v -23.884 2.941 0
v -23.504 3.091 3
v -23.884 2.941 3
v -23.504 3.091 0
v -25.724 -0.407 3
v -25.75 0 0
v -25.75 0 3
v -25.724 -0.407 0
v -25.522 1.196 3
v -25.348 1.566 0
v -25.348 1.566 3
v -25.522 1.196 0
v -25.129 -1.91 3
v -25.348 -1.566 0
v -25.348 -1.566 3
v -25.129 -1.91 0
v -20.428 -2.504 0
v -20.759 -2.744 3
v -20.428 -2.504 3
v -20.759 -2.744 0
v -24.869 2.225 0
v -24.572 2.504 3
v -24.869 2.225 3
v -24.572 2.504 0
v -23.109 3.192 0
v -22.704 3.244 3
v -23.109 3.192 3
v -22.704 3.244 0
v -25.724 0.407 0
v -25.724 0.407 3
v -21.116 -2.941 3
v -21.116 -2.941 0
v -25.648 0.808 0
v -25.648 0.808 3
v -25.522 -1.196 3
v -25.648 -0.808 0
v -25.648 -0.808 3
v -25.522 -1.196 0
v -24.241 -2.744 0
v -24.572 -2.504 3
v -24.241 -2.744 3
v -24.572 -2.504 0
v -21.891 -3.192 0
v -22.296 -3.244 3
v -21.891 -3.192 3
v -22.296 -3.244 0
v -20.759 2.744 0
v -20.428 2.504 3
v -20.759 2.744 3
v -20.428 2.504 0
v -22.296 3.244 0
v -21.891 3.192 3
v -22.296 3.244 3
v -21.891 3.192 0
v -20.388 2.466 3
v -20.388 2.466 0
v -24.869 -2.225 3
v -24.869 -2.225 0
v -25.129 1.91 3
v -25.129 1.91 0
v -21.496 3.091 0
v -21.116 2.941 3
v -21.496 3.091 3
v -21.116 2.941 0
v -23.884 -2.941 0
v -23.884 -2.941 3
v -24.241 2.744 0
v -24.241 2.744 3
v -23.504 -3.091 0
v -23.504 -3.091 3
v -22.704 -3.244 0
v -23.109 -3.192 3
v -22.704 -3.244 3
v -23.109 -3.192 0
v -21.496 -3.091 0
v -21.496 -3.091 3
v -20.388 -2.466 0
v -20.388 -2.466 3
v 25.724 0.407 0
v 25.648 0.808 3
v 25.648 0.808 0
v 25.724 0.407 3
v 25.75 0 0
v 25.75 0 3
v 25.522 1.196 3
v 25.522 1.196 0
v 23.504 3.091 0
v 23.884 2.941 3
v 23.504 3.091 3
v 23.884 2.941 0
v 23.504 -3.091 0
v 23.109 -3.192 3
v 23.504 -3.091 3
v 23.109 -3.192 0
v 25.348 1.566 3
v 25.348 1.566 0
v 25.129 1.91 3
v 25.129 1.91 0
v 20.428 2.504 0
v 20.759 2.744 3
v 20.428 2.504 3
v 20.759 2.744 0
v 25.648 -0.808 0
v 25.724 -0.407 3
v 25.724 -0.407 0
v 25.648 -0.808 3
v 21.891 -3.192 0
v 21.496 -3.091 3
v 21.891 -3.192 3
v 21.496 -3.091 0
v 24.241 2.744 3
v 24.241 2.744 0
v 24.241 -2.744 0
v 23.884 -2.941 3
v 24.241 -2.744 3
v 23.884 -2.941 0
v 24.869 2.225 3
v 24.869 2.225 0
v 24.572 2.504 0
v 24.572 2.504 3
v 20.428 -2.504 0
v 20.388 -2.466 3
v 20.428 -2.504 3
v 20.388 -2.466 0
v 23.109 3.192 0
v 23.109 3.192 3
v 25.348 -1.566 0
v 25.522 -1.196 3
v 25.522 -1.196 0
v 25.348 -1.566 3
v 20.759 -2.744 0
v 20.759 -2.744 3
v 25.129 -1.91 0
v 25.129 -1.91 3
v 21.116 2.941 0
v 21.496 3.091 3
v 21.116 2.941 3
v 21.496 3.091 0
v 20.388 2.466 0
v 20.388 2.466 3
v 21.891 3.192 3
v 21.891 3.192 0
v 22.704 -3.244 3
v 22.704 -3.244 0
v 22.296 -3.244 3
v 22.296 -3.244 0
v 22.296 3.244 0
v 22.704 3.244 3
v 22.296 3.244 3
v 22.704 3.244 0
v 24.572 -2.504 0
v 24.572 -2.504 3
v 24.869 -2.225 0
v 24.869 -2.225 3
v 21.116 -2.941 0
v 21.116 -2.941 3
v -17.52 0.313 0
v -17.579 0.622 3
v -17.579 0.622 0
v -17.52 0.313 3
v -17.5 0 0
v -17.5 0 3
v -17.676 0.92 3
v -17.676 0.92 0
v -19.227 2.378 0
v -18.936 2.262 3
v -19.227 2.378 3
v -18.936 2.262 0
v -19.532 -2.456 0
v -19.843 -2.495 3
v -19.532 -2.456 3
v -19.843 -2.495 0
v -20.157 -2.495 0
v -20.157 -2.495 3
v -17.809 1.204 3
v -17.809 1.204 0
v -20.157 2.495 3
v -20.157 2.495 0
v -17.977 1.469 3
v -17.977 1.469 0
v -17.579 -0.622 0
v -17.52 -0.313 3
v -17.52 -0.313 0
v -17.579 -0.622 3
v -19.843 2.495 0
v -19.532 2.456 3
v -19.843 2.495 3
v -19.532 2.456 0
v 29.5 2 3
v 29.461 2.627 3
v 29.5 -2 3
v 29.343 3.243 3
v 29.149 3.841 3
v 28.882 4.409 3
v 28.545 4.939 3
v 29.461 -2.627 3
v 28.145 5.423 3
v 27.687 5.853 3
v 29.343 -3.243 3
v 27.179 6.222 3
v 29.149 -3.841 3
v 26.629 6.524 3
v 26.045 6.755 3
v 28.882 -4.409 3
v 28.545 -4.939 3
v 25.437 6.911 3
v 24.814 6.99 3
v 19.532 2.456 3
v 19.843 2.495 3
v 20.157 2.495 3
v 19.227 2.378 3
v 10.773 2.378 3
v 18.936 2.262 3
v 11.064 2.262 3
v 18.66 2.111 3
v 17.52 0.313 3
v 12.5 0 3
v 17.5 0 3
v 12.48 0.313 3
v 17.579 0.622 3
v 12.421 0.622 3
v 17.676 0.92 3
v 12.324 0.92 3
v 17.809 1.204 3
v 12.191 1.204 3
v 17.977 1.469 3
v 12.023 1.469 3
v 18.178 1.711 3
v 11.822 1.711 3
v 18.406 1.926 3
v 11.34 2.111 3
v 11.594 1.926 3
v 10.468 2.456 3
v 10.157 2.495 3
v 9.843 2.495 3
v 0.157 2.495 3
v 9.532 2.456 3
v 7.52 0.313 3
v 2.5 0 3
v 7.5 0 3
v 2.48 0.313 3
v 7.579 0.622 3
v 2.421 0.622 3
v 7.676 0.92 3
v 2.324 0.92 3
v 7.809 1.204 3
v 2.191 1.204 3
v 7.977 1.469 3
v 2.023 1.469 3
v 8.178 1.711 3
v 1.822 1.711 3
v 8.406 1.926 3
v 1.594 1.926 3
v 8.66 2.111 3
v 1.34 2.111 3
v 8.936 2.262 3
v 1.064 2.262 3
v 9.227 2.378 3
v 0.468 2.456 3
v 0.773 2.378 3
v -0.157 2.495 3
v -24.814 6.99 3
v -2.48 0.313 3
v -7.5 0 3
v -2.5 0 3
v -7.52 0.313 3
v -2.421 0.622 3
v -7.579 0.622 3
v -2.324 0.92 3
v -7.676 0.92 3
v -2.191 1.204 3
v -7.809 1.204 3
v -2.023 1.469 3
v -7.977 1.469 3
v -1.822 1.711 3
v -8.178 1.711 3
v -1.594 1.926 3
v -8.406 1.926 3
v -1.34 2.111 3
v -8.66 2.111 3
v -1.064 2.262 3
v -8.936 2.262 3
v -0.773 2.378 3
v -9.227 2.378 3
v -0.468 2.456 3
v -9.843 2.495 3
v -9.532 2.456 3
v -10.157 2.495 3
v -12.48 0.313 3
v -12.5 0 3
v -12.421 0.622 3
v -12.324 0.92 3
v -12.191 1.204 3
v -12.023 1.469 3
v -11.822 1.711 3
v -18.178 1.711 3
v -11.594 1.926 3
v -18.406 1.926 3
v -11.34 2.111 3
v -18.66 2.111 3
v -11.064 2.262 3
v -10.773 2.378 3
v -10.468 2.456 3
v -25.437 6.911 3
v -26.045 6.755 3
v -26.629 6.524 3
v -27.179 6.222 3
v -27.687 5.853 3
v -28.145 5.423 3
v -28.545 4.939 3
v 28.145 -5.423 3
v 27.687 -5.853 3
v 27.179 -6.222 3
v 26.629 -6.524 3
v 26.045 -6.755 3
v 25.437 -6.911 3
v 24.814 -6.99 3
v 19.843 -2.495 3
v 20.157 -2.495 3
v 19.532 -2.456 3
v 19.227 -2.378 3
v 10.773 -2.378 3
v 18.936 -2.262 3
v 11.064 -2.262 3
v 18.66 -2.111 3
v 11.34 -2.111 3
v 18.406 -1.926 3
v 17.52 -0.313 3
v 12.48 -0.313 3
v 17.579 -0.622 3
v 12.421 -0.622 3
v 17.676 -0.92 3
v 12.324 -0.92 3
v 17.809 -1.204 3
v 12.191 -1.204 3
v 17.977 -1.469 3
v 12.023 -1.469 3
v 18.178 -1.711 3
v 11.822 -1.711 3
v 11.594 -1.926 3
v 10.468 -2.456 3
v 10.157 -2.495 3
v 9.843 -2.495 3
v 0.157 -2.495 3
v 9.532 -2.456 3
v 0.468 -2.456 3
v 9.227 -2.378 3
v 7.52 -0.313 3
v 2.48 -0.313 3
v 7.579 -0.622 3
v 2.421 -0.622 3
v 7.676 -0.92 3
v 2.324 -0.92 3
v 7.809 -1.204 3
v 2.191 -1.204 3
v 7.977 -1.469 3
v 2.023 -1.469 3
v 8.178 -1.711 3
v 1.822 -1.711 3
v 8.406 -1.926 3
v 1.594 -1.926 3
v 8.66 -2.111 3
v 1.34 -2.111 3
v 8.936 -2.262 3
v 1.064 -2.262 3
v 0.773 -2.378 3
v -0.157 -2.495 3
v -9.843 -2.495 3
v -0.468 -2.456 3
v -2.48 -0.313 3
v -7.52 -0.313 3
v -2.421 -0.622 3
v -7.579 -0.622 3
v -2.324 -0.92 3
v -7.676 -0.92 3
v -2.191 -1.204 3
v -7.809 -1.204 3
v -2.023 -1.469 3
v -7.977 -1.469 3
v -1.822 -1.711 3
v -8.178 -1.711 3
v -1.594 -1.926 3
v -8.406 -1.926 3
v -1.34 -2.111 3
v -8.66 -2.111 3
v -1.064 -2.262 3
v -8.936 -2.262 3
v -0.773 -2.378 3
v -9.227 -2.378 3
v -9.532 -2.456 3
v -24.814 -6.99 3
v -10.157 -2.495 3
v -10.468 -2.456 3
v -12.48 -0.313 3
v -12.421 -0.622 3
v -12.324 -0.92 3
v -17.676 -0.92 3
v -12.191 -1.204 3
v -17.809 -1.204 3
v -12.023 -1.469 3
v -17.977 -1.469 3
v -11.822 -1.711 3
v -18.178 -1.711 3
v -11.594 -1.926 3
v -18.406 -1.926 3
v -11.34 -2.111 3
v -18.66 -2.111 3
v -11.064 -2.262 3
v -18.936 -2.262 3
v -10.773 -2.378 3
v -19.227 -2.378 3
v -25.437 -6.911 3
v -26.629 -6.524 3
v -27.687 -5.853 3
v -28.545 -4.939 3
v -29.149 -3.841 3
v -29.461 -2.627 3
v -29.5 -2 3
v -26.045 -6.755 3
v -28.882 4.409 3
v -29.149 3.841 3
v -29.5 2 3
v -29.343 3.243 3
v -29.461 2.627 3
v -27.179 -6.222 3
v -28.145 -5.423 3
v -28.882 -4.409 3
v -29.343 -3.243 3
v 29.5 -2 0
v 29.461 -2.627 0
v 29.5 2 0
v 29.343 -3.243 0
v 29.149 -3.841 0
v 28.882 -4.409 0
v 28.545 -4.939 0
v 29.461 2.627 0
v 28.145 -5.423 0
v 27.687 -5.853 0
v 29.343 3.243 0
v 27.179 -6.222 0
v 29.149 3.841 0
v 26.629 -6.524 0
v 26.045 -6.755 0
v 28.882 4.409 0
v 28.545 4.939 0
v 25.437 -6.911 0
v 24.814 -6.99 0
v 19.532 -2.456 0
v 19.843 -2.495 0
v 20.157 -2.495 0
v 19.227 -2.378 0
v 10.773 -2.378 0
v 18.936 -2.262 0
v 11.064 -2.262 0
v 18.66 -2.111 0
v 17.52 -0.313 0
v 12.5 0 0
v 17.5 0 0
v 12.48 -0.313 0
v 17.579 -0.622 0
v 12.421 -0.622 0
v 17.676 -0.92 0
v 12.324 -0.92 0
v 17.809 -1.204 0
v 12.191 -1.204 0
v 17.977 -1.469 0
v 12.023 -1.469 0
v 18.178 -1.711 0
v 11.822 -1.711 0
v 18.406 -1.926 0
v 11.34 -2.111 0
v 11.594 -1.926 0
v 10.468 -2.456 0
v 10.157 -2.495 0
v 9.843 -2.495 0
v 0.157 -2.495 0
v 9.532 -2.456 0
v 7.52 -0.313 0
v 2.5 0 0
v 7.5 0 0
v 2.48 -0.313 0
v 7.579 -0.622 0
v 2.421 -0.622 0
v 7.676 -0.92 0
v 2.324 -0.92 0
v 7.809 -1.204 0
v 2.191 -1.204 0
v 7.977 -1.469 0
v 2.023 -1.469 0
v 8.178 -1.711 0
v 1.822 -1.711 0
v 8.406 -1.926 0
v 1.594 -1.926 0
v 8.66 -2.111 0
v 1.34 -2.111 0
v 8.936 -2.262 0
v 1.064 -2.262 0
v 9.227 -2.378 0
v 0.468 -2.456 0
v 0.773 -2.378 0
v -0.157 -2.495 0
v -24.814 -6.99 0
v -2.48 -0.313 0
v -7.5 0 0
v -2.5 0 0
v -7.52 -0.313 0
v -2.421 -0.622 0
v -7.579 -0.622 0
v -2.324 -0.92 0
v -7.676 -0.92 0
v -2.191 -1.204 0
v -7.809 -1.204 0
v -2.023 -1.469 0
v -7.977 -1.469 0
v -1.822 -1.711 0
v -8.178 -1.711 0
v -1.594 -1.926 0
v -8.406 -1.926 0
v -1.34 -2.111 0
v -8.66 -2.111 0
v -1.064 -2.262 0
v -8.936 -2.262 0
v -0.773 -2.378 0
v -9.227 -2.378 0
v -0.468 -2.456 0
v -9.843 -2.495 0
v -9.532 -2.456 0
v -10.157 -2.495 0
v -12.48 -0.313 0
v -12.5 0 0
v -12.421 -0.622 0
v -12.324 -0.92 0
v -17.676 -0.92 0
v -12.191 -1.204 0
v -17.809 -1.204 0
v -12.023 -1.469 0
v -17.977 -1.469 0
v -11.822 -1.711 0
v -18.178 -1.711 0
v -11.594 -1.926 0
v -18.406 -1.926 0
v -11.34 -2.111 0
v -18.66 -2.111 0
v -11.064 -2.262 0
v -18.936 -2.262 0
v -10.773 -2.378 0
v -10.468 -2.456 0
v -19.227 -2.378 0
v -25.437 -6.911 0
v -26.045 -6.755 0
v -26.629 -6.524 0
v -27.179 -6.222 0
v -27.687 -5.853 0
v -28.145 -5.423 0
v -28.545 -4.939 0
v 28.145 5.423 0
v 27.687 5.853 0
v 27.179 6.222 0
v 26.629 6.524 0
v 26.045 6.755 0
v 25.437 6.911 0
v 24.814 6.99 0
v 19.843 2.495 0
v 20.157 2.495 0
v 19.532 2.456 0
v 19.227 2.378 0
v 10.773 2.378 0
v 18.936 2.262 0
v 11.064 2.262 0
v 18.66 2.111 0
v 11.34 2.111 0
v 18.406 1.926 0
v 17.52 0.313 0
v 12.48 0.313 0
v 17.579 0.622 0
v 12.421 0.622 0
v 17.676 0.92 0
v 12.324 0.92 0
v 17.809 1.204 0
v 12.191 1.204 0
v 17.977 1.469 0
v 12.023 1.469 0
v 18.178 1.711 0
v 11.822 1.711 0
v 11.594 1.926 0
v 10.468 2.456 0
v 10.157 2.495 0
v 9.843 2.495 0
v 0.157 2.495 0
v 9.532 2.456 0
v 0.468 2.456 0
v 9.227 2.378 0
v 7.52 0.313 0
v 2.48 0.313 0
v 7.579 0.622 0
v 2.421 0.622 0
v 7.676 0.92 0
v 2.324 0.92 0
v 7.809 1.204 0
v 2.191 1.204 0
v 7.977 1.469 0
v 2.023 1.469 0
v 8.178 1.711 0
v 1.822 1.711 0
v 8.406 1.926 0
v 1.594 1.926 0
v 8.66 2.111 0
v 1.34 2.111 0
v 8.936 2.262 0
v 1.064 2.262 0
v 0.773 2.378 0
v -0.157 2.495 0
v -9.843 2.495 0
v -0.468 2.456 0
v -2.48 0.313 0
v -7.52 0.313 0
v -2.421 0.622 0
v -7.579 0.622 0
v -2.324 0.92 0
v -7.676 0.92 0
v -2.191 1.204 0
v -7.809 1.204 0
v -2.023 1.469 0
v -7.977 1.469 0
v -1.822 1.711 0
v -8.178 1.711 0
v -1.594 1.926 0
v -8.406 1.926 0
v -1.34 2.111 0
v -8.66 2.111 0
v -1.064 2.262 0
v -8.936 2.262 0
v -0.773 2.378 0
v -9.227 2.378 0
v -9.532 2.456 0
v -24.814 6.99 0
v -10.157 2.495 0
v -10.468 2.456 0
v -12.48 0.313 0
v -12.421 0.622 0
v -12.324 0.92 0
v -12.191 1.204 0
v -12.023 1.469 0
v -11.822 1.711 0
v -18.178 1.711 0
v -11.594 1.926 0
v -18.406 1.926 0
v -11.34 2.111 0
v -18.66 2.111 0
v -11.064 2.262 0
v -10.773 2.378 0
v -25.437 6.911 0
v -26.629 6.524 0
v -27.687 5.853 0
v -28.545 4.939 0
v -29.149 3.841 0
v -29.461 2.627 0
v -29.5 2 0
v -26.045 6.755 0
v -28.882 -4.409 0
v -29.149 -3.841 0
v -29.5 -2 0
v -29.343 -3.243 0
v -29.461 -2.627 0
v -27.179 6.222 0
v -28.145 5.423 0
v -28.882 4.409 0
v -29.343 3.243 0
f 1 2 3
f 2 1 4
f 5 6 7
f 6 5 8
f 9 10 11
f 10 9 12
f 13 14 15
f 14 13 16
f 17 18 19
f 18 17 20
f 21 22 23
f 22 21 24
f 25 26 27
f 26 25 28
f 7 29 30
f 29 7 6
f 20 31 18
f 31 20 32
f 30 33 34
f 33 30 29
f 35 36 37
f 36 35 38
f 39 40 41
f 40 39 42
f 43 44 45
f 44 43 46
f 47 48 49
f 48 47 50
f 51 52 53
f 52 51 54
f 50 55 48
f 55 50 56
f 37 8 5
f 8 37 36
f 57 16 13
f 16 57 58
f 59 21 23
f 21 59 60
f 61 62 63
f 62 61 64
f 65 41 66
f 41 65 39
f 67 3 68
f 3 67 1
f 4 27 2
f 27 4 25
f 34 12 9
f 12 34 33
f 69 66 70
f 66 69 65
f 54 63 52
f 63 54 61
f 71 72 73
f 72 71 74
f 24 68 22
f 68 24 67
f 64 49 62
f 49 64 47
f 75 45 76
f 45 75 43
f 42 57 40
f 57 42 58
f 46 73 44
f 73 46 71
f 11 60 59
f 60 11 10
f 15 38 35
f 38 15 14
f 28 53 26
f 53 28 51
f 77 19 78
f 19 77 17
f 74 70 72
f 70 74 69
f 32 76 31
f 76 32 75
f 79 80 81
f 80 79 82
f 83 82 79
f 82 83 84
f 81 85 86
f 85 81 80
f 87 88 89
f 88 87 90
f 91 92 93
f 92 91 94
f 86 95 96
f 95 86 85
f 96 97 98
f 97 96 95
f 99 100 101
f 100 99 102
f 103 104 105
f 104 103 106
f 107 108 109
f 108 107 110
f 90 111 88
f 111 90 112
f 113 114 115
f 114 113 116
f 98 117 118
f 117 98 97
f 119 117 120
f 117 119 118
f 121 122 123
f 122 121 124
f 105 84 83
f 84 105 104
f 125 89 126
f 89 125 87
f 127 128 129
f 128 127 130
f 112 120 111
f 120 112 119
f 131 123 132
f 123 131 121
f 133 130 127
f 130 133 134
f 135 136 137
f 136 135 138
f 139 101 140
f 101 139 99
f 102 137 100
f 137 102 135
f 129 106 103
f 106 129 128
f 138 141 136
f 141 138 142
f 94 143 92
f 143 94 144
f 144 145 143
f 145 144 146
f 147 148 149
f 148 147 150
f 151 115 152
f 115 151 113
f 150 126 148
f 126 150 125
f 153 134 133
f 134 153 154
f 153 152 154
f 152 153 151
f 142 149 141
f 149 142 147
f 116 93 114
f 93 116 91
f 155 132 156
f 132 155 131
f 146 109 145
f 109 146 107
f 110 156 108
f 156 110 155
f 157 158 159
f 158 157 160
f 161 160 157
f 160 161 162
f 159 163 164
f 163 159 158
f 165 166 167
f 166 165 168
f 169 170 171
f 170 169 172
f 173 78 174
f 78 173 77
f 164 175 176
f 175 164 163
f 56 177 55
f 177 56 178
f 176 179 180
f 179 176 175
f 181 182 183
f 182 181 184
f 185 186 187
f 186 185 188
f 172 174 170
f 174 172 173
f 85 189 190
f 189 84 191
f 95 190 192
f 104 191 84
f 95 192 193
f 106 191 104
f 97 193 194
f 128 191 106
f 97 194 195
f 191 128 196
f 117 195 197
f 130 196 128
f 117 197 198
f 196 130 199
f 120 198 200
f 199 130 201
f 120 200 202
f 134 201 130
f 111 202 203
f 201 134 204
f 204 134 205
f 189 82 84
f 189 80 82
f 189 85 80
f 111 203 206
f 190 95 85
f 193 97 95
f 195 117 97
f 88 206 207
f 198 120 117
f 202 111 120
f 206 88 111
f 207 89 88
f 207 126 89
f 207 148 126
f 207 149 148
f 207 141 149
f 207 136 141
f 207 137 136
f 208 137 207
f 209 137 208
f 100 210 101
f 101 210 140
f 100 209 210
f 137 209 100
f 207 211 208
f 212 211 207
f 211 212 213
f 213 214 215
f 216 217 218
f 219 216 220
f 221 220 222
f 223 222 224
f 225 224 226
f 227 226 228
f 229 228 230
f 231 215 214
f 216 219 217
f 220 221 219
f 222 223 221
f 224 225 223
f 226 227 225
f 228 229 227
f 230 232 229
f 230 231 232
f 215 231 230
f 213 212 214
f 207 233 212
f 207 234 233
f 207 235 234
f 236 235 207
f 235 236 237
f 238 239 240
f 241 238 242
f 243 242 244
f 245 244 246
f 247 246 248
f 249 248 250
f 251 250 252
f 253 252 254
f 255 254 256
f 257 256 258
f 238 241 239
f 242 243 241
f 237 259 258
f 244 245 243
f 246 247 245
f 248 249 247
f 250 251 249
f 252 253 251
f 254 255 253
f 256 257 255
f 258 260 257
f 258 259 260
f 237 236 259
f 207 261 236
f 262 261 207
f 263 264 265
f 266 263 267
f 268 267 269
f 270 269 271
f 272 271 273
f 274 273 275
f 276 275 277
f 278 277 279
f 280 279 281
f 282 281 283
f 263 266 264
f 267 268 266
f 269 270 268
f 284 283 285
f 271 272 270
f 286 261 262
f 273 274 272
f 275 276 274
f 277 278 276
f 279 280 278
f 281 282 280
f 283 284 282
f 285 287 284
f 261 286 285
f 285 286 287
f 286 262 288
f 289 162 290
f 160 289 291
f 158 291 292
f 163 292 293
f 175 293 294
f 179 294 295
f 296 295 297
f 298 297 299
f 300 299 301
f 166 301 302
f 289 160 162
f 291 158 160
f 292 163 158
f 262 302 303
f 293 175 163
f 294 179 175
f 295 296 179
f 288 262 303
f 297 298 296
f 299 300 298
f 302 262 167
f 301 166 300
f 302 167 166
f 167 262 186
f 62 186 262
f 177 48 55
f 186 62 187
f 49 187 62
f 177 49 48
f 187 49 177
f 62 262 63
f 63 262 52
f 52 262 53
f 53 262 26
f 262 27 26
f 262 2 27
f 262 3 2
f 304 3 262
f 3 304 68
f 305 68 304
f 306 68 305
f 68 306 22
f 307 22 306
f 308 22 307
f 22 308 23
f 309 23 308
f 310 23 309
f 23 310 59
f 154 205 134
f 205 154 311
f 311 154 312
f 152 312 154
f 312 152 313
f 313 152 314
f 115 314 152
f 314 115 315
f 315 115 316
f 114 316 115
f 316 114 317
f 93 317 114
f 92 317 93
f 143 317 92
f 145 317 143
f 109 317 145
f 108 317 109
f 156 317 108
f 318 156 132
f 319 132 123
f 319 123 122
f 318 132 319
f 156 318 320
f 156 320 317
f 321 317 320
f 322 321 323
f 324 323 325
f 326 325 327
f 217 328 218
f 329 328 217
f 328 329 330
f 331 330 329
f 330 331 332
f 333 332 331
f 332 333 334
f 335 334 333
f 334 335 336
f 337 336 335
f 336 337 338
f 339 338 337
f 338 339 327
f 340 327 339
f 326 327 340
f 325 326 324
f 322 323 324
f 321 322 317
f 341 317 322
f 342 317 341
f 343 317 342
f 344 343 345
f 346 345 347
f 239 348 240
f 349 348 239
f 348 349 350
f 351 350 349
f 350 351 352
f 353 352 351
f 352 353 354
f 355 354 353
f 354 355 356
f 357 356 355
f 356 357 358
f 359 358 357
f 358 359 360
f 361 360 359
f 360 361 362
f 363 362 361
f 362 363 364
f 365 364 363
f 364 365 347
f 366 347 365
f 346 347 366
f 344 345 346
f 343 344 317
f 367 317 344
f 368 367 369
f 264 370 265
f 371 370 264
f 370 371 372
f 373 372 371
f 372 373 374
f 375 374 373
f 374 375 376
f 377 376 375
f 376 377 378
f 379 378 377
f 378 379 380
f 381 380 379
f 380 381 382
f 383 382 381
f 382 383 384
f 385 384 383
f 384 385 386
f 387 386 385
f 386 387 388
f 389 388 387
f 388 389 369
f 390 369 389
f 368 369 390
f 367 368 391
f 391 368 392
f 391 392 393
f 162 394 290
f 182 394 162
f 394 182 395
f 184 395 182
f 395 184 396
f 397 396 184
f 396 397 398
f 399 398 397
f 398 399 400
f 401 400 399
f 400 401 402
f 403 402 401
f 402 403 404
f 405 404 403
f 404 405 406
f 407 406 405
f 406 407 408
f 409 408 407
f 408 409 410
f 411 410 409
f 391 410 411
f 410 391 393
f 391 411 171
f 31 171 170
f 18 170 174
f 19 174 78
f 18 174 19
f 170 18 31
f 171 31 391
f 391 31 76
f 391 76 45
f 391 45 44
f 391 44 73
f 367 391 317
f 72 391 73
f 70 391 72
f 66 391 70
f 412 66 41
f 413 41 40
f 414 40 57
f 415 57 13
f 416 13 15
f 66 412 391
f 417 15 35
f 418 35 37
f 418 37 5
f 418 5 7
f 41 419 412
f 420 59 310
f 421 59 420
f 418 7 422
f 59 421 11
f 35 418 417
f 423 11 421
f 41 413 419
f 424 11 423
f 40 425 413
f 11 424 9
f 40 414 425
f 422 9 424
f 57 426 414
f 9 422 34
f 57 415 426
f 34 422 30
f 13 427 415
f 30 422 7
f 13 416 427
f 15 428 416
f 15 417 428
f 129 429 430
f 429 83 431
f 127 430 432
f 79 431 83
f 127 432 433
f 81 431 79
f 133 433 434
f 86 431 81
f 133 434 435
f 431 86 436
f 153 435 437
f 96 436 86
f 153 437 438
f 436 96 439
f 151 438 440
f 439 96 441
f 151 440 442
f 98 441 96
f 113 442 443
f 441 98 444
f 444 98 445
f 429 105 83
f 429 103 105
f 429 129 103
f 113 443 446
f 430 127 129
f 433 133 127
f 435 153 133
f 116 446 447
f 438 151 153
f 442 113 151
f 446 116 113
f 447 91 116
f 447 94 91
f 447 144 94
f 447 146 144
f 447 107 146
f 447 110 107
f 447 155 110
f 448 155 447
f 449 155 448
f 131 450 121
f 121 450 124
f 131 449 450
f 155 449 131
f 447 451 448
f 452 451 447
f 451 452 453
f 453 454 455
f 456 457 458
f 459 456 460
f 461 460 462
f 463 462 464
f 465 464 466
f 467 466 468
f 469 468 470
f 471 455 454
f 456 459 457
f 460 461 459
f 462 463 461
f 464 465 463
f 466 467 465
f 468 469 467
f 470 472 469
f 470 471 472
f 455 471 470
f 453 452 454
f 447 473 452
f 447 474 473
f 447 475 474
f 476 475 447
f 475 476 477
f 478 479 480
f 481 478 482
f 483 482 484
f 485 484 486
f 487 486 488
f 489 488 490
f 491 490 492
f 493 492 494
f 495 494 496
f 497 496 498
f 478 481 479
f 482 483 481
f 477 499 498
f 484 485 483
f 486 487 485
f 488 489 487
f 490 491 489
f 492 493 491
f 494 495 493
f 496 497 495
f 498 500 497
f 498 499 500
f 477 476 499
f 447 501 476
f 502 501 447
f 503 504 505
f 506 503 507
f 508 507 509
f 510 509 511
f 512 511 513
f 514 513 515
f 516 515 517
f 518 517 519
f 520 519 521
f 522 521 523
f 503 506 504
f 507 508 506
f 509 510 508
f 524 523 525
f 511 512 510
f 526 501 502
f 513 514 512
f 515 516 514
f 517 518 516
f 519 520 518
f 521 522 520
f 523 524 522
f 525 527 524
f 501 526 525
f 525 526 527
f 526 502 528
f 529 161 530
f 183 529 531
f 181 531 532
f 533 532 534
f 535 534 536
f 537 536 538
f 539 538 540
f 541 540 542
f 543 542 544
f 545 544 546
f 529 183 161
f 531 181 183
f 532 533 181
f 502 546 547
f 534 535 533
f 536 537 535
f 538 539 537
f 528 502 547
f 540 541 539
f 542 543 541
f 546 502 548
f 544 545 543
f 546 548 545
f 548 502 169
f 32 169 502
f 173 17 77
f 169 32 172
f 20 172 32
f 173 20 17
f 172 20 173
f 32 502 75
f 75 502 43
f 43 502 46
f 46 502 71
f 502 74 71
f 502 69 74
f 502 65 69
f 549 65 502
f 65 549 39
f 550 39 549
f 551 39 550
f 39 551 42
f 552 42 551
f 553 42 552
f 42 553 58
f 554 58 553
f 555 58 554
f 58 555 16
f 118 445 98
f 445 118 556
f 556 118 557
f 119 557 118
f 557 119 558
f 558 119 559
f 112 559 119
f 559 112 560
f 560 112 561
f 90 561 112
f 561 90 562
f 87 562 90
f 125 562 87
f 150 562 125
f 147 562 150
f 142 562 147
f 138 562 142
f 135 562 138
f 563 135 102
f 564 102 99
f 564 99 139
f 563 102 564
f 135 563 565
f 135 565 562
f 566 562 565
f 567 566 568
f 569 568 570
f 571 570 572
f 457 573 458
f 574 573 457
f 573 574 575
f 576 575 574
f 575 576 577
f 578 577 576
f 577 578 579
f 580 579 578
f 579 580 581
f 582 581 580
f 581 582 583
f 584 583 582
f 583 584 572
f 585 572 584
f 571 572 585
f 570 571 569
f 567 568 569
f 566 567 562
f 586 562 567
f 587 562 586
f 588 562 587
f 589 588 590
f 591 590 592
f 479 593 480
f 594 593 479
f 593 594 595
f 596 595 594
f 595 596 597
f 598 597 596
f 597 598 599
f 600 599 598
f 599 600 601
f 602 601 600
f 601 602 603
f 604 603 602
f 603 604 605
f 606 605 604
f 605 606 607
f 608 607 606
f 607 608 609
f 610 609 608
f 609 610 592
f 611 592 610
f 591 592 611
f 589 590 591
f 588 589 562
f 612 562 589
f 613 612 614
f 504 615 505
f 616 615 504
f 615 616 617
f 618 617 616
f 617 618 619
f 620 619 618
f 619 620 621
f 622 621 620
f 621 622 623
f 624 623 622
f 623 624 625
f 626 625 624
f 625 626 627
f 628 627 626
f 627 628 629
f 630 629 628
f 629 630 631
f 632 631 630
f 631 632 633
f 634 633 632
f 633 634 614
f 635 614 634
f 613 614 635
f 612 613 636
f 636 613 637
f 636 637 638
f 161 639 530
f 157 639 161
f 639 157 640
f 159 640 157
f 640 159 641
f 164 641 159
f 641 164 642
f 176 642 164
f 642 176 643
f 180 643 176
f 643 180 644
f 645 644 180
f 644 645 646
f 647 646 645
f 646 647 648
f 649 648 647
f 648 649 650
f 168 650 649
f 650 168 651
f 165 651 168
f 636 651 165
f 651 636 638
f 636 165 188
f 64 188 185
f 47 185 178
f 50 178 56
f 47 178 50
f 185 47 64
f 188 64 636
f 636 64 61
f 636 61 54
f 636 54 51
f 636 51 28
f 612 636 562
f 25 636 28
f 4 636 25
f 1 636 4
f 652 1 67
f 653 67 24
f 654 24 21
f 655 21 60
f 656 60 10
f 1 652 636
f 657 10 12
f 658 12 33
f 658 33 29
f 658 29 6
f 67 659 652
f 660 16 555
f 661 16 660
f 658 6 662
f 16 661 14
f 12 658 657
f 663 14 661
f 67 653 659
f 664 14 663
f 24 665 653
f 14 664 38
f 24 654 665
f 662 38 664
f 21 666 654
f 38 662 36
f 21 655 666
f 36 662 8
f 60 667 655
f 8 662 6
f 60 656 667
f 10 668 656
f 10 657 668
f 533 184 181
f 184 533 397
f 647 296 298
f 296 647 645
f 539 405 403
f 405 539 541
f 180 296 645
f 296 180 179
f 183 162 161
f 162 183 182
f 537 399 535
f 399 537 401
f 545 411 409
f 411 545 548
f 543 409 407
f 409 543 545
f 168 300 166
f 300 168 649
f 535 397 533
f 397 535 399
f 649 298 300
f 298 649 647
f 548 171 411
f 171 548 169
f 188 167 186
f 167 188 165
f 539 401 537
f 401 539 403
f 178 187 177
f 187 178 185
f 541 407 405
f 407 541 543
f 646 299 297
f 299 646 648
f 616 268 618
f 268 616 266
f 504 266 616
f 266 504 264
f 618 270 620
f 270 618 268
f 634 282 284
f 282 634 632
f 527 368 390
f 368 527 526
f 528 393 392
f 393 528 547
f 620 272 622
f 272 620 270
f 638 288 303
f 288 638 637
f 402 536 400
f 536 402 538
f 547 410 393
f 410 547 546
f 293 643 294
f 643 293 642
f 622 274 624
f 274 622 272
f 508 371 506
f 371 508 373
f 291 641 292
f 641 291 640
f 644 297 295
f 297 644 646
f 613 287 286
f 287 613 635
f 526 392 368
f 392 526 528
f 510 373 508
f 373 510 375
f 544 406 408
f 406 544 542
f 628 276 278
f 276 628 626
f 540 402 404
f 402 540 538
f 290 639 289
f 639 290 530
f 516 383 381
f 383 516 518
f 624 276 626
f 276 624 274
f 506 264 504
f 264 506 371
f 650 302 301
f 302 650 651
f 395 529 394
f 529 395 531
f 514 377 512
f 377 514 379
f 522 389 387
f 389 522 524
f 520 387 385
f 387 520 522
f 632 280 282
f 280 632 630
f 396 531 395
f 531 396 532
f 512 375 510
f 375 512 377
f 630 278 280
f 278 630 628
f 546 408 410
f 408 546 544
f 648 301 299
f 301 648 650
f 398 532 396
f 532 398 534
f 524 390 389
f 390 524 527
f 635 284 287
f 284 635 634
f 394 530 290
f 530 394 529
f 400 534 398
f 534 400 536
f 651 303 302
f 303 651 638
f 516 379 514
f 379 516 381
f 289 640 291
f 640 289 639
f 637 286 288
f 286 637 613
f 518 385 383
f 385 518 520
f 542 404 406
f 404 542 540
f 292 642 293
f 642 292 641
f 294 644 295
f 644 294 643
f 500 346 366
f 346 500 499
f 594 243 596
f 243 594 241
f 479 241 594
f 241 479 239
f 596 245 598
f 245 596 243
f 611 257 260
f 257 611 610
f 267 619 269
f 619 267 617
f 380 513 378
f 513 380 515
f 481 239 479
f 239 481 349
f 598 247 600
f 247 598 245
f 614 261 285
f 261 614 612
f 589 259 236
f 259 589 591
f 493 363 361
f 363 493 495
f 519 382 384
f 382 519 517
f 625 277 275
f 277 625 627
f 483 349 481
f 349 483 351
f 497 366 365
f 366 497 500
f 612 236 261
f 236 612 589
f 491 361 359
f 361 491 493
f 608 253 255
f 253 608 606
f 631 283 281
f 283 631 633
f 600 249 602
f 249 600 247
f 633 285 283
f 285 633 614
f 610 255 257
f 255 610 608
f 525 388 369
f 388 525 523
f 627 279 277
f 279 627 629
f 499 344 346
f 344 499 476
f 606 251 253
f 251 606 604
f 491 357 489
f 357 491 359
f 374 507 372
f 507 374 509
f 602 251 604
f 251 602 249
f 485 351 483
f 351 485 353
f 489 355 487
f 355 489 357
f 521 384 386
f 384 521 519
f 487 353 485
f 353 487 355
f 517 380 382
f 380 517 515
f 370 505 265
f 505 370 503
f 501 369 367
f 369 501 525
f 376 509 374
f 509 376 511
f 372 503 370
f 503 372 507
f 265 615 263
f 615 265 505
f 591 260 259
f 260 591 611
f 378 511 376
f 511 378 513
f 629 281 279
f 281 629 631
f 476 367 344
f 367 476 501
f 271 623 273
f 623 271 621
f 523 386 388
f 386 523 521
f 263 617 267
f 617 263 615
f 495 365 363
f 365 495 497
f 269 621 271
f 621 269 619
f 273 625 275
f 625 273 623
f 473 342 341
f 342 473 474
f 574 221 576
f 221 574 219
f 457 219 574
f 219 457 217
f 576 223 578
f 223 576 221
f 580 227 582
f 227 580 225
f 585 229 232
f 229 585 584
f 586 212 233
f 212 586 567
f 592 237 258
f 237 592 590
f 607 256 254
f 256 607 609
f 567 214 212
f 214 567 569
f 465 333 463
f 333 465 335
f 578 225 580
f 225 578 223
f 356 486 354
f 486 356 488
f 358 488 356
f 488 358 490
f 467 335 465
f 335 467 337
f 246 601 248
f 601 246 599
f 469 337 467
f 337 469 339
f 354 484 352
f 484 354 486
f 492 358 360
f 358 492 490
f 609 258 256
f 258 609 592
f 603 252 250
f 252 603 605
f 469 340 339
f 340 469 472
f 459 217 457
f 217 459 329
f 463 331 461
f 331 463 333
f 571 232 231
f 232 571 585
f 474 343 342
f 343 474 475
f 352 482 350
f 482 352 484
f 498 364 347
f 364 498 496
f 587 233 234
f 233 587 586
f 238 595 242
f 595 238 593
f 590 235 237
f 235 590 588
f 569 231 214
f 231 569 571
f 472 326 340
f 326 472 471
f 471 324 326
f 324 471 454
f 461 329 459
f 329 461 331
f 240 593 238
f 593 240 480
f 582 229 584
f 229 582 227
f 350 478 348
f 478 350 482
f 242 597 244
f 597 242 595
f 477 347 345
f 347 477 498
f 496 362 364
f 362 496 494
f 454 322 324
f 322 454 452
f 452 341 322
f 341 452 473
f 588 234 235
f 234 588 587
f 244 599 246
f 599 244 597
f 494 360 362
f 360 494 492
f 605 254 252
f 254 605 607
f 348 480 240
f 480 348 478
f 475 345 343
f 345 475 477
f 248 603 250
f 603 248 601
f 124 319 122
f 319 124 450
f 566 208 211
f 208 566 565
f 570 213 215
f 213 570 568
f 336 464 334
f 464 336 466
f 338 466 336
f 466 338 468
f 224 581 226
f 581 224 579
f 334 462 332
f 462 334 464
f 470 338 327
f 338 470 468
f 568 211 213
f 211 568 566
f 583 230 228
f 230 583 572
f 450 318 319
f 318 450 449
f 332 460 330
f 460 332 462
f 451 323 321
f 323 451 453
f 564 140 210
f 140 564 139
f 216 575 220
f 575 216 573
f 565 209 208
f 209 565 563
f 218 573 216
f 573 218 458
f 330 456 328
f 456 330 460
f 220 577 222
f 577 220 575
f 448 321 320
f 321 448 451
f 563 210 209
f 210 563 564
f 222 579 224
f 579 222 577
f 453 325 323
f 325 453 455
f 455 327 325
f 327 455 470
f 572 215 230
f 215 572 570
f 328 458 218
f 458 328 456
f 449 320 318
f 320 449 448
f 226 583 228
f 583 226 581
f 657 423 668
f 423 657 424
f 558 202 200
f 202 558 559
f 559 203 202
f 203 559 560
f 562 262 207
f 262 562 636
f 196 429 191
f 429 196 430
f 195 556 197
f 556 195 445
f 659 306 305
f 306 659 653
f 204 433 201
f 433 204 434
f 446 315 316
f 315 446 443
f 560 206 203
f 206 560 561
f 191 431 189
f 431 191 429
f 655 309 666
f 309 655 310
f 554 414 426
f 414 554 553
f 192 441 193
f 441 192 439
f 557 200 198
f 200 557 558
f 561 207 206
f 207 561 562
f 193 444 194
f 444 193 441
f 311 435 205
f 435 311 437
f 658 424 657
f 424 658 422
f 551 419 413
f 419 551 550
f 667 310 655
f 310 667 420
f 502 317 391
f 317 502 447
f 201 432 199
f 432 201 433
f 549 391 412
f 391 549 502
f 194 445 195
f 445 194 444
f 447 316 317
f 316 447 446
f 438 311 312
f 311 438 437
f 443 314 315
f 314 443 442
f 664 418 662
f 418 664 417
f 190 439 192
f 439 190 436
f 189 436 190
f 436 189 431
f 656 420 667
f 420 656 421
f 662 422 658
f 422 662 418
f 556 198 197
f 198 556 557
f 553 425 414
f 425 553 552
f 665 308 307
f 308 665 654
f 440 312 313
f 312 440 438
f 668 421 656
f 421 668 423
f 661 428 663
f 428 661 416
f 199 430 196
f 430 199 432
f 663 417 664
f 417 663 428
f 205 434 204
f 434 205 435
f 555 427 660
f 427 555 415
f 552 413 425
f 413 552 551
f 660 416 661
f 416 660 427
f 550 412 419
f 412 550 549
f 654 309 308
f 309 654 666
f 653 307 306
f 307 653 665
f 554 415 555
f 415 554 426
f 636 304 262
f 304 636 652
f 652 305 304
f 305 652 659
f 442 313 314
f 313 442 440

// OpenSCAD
$fn = 50;


difference() {
	union() {
		hull() {
			translate(v = [-24.5000000000, 2.0000000000, 0]) {
				cylinder(h = 3, r = 5);
			}
			translate(v = [24.5000000000, 2.0000000000, 0]) {
				cylinder(h = 3, r = 5);
			}
			translate(v = [-24.5000000000, -2.0000000000, 0]) {
				cylinder(h = 3, r = 5);
			}
			translate(v = [24.5000000000, -2.0000000000, 0]) {
				cylinder(h = 3, r = 5);
			}
		}
	}
	union() {
		#translate(v = [-22.5000000000, 0.0000000000, -100.0000000000]) {
			cylinder(h = 200, r = 3.2500000000);
		}
		#translate(v = [-22.5000000000, 0.0000000000, -100.0000000000]) {
			cylinder(h = 200, r = 3.2500000000);
		}
		#translate(v = [22.5000000000, 0.0000000000, -100.0000000000]) {
			cylinder(h = 200, r = 3.2500000000);
		}
		#translate(v = [22.5000000000, 0.0000000000, -100.0000000000]) {
			cylinder(h = 200, r = 3.2500000000);
		}
		#translate(v = [-20.0000000000, 0, 0]) {
			cylinder(h = 3, r = 2.5000000000);
		}
		#translate(v = [-10.0000000000, 0, 0]) {
			cylinder(h = 3, r = 2.5000000000);
		}
		#cylinder(h = 3, r = 2.5000000000);
		#translate(v = [10.0000000000, 0, 0]) {
			cylinder(h = 3, r = 2.5000000000);
		}
		#translate(v = [20.0000000000, 0, 0]) {
			cylinder(h = 3, r = 2.5000000000);
		}
	}
}
